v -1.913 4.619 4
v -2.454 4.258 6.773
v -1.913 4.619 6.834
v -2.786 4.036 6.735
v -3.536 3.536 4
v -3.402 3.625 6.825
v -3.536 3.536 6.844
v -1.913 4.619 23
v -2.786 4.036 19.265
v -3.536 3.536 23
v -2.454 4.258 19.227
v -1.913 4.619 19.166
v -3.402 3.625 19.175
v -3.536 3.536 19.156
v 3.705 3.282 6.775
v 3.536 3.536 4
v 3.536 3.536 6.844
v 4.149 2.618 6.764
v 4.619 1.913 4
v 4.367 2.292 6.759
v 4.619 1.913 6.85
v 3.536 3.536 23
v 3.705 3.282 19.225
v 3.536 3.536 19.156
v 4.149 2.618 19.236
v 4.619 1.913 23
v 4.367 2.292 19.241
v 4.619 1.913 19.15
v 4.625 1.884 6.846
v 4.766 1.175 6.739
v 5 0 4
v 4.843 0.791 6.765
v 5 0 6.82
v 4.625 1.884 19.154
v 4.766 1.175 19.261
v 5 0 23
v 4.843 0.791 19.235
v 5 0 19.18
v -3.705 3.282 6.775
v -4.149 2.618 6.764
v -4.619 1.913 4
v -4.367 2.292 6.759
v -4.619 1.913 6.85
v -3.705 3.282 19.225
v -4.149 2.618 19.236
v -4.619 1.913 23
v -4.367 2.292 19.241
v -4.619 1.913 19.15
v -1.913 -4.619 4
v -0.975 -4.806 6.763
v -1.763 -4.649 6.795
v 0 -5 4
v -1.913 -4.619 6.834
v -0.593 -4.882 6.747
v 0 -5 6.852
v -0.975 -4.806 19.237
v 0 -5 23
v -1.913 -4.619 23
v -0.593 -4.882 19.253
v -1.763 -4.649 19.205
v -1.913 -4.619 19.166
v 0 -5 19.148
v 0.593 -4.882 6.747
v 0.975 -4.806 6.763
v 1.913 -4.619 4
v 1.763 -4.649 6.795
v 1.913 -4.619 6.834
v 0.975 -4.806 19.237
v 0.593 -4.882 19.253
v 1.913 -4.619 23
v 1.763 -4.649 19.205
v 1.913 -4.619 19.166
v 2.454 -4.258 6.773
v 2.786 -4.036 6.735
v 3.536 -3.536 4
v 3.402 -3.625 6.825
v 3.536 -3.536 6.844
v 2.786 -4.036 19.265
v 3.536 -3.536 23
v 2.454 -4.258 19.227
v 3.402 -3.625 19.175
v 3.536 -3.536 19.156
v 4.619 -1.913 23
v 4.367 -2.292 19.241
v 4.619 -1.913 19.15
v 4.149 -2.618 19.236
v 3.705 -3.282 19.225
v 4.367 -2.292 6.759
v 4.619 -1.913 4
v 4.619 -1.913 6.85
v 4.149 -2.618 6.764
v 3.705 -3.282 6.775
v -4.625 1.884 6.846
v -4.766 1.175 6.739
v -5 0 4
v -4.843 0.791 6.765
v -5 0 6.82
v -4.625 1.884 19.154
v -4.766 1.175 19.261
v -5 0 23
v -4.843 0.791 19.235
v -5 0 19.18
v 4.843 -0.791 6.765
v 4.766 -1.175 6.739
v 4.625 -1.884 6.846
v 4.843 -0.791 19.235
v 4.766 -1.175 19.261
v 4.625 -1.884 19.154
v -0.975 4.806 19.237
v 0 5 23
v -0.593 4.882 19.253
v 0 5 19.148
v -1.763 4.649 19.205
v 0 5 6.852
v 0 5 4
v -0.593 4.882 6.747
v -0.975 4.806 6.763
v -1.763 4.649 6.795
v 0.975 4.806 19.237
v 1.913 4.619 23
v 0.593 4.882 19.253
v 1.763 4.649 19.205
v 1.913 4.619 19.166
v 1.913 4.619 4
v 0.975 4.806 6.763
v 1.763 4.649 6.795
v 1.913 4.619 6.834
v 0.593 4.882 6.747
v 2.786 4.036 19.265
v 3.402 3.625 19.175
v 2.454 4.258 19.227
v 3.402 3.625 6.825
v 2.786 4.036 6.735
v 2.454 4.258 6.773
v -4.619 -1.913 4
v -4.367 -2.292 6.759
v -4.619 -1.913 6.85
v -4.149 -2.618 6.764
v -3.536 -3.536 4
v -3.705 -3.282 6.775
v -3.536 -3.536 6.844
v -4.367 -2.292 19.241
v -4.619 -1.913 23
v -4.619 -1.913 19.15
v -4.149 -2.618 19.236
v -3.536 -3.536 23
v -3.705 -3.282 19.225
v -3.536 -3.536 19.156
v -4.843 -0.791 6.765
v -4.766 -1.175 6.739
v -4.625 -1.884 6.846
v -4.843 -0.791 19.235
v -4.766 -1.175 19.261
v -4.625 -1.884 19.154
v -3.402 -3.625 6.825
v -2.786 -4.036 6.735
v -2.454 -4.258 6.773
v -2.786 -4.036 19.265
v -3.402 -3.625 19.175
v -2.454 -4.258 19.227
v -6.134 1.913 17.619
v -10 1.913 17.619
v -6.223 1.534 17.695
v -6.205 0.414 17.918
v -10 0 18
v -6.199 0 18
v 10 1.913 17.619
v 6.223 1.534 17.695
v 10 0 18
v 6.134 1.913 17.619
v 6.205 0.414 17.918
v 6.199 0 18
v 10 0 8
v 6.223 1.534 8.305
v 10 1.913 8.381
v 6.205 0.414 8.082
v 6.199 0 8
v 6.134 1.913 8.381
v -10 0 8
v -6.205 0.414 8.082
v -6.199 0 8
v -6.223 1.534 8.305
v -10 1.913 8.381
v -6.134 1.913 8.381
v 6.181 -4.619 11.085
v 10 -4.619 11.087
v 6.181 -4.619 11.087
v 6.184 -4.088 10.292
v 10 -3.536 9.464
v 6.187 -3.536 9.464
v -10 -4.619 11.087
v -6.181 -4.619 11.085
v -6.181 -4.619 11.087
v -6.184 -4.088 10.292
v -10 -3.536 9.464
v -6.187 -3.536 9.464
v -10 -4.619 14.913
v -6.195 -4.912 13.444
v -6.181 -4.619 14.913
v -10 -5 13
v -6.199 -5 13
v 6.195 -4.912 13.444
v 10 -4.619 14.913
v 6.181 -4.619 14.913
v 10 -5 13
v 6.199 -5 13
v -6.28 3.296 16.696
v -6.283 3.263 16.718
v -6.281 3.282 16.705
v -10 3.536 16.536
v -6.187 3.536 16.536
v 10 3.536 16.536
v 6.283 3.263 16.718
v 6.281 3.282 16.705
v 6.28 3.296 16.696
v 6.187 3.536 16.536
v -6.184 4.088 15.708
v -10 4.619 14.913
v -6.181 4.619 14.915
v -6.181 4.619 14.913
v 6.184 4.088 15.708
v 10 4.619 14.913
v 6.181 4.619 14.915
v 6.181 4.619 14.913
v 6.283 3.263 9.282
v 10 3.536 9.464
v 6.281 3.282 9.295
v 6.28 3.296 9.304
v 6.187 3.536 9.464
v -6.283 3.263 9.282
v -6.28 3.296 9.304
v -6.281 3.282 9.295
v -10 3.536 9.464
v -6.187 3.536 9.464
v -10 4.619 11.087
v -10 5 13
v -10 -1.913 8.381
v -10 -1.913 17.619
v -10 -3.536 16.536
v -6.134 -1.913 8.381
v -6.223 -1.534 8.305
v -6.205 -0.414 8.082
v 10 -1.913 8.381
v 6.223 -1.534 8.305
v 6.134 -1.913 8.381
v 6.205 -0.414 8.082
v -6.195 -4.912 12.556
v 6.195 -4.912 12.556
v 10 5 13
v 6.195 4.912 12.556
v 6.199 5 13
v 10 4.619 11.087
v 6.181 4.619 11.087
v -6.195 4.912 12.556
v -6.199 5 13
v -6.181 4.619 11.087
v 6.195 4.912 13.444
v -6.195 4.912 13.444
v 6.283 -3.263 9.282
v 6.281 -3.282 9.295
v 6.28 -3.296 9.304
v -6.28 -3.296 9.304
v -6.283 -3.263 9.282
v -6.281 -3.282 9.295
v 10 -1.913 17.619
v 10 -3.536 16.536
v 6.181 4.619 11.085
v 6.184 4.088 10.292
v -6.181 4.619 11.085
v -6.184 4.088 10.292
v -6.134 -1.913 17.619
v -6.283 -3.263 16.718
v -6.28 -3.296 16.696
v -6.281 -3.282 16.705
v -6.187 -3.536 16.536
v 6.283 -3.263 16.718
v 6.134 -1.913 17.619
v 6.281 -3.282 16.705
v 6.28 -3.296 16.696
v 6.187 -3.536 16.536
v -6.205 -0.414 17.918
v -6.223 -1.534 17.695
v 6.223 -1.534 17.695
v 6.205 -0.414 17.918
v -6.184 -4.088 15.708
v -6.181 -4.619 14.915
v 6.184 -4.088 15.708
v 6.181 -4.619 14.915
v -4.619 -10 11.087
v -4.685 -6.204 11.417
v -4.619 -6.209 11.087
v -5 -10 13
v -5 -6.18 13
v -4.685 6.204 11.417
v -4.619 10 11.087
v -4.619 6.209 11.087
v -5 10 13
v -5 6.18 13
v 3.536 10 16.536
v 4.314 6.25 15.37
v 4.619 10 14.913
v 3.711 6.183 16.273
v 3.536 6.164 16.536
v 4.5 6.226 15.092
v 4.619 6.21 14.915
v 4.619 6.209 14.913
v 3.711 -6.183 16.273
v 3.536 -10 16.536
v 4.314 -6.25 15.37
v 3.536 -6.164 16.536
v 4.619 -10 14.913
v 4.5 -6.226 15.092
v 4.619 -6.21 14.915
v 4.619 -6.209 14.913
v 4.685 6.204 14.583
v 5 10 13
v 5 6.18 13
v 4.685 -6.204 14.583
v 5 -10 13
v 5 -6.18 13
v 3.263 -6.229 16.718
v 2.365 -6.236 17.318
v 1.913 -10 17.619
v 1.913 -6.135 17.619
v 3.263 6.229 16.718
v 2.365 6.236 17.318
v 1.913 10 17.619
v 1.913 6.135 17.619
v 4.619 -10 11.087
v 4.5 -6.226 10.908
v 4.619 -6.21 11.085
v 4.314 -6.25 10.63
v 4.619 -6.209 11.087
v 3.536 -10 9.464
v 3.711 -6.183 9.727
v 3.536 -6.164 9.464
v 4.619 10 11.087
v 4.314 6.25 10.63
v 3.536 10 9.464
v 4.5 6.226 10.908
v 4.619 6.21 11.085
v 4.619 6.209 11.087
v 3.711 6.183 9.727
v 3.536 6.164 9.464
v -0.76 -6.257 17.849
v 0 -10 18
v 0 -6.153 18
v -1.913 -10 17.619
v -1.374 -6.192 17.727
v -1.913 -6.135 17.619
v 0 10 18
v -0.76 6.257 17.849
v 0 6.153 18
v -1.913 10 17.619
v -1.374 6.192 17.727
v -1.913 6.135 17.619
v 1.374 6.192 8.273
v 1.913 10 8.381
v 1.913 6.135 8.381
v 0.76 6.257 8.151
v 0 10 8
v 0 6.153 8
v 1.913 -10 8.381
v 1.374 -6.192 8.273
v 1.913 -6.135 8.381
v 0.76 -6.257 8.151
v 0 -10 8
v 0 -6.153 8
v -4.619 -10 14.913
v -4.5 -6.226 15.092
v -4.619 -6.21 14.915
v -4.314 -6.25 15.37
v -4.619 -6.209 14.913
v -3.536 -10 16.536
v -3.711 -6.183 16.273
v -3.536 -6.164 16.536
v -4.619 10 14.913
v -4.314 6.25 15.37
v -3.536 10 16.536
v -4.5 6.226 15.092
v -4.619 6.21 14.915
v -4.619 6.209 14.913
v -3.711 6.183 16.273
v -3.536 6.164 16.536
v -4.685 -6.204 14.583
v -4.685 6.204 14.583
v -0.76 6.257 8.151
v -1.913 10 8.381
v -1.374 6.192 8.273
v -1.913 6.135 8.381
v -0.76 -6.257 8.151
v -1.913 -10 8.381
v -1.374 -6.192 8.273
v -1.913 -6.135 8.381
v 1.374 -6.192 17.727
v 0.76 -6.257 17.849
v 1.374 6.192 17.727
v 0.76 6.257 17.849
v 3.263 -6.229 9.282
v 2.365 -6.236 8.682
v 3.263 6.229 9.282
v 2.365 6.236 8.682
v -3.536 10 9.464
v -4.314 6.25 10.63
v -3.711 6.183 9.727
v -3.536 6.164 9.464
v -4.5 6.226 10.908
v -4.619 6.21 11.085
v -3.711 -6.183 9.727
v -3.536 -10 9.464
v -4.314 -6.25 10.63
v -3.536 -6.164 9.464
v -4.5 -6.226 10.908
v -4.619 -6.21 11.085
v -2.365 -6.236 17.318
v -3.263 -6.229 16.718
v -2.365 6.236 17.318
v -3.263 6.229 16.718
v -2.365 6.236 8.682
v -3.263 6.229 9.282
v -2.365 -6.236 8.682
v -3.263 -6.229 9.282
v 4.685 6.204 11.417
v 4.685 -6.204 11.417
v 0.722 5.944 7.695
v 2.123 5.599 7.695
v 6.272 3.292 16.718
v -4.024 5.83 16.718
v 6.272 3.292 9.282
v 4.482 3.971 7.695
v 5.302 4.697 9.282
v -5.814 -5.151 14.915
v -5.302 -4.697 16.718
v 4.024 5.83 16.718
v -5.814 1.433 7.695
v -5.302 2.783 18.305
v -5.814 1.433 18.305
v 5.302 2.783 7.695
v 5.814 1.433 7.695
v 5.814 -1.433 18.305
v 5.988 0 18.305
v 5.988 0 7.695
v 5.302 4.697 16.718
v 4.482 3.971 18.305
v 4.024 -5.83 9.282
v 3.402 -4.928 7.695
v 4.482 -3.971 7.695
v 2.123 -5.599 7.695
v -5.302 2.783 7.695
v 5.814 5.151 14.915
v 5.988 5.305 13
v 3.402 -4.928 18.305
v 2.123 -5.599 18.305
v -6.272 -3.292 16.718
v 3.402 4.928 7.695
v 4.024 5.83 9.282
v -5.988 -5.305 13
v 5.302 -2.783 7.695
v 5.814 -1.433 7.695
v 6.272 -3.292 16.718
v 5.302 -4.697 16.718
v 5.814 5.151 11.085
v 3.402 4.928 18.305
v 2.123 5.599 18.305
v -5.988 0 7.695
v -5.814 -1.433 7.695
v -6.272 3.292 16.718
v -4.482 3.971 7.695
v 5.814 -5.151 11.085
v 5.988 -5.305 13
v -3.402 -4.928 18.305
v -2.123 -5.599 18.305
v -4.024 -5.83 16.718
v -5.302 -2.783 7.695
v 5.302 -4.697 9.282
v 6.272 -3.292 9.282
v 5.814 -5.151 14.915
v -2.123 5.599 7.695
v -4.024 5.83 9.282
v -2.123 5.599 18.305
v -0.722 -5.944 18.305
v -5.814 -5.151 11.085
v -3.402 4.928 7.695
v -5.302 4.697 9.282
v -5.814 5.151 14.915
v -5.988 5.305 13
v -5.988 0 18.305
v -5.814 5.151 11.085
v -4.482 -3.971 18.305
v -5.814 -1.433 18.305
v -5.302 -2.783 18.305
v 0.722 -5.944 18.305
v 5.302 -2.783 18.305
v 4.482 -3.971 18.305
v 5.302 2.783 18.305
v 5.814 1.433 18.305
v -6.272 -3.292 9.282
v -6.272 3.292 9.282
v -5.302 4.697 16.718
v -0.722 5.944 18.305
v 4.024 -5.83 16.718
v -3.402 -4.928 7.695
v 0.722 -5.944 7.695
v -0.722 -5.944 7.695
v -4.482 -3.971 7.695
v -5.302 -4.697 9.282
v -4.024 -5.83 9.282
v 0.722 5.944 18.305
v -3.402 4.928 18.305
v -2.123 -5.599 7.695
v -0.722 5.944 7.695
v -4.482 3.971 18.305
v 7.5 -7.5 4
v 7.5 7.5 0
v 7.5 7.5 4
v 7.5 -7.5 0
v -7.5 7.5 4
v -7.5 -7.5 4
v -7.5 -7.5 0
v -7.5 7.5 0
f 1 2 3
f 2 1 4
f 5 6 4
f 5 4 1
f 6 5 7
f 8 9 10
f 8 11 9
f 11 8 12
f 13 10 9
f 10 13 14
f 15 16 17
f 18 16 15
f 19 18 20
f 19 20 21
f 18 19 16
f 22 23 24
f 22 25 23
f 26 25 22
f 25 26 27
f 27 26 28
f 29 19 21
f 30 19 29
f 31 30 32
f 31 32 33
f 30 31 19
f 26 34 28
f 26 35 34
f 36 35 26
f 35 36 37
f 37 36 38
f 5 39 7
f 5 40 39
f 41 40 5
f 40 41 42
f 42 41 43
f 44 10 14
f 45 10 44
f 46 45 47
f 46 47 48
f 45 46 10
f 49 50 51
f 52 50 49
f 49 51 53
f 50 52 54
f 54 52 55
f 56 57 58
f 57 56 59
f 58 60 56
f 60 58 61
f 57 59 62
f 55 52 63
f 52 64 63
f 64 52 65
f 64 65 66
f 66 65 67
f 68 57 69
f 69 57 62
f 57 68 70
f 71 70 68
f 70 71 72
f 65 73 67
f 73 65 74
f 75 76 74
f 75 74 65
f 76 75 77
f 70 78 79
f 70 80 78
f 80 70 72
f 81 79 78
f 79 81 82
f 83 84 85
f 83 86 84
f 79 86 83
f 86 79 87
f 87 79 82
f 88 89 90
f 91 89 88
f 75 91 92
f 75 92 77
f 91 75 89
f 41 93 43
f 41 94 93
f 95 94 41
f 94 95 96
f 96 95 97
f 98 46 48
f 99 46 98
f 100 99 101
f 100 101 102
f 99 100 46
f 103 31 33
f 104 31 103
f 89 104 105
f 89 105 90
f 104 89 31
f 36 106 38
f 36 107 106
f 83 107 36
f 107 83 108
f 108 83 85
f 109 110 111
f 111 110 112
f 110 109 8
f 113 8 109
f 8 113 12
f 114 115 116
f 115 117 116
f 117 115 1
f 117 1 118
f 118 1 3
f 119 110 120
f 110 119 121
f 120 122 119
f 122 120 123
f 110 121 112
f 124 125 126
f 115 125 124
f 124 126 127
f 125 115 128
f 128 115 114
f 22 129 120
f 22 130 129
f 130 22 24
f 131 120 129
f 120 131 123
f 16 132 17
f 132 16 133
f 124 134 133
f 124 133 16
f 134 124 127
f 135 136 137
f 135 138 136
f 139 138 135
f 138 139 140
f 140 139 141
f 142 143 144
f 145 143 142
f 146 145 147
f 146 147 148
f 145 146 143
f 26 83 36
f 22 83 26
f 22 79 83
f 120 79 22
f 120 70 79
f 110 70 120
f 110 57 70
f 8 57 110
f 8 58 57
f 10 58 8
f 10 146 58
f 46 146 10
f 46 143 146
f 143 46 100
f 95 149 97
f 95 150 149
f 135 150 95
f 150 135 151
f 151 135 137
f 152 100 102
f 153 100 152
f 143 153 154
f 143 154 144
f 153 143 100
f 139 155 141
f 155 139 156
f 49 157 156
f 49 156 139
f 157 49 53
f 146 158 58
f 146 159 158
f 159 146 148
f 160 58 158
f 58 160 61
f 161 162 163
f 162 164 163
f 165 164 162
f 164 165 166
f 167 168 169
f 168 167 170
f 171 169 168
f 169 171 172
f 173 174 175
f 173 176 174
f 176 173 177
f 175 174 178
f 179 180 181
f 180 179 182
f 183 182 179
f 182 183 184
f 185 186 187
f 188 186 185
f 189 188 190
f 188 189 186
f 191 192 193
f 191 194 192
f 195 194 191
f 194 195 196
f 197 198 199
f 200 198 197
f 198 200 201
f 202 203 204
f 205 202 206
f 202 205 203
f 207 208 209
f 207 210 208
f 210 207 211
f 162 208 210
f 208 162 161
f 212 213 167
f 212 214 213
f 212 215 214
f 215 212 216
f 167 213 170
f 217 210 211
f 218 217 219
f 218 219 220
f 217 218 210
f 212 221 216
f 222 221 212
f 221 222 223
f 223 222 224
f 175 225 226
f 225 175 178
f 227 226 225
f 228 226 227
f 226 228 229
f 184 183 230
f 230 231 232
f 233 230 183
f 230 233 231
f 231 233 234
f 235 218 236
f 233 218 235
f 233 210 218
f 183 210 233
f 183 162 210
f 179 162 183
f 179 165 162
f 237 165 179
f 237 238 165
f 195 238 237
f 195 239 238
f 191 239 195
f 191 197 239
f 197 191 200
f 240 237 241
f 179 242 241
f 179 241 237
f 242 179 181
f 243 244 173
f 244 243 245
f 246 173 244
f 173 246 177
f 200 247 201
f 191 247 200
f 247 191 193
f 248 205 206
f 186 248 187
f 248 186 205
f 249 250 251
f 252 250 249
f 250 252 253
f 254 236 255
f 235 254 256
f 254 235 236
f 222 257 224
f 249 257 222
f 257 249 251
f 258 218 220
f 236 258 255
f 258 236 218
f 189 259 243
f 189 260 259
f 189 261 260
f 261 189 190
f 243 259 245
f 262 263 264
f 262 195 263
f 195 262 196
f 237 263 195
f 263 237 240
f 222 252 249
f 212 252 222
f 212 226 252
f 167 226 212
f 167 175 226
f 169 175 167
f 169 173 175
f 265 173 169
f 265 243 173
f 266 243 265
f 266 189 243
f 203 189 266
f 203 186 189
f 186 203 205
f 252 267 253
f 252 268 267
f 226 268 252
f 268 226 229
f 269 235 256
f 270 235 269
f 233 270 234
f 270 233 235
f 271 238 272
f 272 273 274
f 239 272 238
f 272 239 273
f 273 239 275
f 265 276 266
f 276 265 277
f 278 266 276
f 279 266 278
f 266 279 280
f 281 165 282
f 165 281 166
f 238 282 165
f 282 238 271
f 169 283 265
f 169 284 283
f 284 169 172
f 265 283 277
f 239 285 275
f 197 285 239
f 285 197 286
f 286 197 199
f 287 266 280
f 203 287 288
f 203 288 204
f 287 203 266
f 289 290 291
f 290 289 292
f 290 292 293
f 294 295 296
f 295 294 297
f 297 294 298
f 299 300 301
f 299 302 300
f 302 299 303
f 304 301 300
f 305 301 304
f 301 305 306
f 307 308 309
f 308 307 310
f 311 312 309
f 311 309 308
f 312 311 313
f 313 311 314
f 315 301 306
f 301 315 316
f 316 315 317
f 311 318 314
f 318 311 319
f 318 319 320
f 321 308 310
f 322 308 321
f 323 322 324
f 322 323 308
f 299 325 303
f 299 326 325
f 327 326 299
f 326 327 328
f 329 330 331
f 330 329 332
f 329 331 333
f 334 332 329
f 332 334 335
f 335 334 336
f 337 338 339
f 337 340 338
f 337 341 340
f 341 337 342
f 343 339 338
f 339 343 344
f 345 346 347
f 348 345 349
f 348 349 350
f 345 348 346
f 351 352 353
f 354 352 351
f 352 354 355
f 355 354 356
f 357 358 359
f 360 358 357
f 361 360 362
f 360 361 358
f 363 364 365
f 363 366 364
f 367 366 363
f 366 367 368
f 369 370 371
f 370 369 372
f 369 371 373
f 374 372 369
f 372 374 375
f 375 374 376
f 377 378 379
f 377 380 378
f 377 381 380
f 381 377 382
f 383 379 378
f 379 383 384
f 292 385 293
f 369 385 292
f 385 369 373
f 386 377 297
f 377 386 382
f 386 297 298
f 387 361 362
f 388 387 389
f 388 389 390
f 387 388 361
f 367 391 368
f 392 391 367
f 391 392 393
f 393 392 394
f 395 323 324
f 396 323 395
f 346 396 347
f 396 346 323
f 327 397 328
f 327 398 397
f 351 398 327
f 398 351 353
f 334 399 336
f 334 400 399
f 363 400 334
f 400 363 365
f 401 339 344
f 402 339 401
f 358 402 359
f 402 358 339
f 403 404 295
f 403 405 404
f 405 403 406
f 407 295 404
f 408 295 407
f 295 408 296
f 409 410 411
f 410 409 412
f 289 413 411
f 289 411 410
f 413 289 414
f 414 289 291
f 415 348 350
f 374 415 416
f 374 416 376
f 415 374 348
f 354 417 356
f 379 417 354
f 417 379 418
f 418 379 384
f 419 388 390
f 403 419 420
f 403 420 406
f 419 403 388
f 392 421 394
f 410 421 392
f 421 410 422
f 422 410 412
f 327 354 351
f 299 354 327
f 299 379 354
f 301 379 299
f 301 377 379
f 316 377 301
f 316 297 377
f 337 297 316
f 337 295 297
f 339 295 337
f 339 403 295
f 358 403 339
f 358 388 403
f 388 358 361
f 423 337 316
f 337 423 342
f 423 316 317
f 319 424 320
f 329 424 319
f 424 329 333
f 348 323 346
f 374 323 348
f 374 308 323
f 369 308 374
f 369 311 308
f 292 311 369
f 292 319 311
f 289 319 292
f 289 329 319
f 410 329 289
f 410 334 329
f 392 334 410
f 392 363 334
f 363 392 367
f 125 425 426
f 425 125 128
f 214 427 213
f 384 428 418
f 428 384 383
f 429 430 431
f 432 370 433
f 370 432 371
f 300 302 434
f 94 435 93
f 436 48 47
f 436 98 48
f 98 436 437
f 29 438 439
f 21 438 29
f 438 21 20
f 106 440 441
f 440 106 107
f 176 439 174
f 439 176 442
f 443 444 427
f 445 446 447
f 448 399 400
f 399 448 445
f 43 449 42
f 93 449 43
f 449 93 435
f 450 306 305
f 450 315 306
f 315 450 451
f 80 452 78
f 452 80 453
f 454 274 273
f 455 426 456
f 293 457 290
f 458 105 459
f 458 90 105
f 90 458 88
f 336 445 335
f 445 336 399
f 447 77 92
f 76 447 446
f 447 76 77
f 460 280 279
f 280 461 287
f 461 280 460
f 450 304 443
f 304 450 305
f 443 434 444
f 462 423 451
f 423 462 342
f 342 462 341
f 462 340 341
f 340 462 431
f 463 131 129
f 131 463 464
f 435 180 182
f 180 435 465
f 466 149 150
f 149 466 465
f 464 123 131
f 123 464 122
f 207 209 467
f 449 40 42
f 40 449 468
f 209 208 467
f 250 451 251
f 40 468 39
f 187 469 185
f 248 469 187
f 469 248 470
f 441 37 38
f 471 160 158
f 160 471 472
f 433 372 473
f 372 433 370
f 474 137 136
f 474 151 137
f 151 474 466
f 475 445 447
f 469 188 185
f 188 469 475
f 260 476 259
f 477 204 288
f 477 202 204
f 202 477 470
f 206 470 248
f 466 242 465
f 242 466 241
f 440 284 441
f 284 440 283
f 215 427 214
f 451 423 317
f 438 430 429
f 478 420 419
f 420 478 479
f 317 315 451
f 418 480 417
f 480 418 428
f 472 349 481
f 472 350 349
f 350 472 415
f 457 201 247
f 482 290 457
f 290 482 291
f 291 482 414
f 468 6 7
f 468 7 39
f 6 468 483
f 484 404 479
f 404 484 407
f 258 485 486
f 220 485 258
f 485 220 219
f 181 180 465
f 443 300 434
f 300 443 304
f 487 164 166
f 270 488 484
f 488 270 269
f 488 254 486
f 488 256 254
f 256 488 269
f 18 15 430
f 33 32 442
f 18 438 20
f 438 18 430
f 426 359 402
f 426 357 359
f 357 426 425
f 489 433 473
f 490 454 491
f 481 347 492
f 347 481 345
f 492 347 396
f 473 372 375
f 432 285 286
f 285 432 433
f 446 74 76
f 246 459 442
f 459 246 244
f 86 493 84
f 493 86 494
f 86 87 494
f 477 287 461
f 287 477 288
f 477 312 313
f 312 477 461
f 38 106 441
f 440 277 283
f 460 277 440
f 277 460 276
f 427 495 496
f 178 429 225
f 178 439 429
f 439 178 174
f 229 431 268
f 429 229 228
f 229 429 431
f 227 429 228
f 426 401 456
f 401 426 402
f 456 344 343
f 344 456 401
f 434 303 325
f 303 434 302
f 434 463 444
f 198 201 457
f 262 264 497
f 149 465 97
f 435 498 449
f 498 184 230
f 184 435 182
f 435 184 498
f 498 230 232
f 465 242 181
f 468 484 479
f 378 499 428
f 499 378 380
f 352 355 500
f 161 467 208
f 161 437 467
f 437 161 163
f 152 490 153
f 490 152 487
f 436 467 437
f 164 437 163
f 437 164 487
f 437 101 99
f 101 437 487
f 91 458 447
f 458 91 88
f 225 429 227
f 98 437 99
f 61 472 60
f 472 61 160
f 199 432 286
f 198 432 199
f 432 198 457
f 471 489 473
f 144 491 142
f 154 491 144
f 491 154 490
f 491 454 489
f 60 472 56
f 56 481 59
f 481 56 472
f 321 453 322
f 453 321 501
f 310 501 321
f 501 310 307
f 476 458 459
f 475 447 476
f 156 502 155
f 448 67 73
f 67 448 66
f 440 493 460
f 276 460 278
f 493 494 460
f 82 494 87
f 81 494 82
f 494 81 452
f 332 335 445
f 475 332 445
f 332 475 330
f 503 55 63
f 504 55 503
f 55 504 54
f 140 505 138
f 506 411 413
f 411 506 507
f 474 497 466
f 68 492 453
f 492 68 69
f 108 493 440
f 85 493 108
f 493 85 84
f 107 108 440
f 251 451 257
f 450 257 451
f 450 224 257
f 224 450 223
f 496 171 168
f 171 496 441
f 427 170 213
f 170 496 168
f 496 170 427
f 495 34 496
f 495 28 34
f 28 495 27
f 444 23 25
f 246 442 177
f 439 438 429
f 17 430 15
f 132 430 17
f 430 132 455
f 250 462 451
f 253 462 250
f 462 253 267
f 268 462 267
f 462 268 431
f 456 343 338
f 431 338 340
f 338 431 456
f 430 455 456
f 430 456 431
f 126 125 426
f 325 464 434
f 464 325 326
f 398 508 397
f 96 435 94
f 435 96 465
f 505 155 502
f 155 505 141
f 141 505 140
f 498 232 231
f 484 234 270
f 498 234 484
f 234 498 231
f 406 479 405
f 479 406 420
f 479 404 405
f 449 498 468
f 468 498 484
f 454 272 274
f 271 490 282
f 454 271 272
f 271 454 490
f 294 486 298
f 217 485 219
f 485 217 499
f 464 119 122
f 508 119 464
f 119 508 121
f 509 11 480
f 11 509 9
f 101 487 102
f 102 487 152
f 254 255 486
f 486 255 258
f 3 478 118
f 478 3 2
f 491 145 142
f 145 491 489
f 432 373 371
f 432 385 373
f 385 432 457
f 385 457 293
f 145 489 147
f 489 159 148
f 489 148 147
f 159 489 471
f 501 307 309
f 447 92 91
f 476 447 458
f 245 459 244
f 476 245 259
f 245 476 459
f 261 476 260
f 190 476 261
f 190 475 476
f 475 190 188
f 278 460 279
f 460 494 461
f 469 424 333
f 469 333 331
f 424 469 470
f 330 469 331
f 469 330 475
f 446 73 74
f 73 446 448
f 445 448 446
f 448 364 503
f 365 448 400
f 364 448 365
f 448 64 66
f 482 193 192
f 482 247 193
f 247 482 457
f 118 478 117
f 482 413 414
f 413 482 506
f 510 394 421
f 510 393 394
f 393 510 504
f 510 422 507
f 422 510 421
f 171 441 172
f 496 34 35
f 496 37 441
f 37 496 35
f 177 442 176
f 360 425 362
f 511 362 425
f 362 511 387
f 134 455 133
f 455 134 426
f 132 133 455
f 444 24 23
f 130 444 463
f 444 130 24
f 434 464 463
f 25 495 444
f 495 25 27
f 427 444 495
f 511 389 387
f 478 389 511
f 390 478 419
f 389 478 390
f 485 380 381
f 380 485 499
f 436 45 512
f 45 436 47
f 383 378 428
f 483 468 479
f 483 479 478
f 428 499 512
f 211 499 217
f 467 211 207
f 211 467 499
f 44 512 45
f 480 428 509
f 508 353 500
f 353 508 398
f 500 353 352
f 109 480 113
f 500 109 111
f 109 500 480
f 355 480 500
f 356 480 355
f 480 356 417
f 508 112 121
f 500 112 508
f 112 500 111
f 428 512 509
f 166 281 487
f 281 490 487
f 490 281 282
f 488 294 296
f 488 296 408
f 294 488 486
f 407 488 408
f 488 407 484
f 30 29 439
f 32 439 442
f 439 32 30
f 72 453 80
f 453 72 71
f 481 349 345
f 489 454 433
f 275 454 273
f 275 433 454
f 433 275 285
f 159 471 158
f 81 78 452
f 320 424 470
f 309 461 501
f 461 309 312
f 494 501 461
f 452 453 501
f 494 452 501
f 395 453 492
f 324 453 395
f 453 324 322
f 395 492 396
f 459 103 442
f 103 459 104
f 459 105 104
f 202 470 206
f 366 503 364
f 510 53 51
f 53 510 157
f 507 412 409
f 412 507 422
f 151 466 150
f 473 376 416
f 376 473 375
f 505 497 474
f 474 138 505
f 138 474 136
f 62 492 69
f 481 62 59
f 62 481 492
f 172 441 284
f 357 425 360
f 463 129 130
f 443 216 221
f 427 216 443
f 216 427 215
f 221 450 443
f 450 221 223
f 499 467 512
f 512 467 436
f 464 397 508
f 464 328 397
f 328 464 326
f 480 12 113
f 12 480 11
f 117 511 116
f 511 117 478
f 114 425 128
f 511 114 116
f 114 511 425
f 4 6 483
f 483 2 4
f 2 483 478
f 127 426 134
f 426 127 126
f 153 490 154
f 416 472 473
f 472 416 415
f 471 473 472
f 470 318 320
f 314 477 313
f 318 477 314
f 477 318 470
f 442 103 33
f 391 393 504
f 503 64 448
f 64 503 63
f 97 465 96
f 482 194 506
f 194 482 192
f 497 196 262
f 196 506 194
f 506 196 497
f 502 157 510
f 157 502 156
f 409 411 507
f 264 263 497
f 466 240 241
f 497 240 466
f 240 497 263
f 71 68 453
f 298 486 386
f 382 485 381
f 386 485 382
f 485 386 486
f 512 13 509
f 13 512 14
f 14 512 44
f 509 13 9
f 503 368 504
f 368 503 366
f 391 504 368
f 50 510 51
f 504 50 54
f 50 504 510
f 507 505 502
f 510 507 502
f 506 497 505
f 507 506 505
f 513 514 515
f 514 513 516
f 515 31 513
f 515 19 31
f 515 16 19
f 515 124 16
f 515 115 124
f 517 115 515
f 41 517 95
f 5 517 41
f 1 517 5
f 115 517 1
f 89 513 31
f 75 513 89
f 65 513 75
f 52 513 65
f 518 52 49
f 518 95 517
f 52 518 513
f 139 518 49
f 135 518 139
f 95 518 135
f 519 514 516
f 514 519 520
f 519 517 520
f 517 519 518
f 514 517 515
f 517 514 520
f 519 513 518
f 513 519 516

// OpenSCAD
translate([0, 0, 3])
{
cylinder(h=20, r=5);
translate([-10, 0, 10])
{
rotate([0,90,0])
{
cylinder(h=20, r=5);
}
}
translate([0, 10, 10])
{
rotate([90,0,0])
{
cylinder(h=20, r=5);
}
}
translate([0, 0, 10])
{
sphere(r = 8);
}
}
translate([-7.5, -7.5, 0])
{
cube([15, 15, 4]);
}
